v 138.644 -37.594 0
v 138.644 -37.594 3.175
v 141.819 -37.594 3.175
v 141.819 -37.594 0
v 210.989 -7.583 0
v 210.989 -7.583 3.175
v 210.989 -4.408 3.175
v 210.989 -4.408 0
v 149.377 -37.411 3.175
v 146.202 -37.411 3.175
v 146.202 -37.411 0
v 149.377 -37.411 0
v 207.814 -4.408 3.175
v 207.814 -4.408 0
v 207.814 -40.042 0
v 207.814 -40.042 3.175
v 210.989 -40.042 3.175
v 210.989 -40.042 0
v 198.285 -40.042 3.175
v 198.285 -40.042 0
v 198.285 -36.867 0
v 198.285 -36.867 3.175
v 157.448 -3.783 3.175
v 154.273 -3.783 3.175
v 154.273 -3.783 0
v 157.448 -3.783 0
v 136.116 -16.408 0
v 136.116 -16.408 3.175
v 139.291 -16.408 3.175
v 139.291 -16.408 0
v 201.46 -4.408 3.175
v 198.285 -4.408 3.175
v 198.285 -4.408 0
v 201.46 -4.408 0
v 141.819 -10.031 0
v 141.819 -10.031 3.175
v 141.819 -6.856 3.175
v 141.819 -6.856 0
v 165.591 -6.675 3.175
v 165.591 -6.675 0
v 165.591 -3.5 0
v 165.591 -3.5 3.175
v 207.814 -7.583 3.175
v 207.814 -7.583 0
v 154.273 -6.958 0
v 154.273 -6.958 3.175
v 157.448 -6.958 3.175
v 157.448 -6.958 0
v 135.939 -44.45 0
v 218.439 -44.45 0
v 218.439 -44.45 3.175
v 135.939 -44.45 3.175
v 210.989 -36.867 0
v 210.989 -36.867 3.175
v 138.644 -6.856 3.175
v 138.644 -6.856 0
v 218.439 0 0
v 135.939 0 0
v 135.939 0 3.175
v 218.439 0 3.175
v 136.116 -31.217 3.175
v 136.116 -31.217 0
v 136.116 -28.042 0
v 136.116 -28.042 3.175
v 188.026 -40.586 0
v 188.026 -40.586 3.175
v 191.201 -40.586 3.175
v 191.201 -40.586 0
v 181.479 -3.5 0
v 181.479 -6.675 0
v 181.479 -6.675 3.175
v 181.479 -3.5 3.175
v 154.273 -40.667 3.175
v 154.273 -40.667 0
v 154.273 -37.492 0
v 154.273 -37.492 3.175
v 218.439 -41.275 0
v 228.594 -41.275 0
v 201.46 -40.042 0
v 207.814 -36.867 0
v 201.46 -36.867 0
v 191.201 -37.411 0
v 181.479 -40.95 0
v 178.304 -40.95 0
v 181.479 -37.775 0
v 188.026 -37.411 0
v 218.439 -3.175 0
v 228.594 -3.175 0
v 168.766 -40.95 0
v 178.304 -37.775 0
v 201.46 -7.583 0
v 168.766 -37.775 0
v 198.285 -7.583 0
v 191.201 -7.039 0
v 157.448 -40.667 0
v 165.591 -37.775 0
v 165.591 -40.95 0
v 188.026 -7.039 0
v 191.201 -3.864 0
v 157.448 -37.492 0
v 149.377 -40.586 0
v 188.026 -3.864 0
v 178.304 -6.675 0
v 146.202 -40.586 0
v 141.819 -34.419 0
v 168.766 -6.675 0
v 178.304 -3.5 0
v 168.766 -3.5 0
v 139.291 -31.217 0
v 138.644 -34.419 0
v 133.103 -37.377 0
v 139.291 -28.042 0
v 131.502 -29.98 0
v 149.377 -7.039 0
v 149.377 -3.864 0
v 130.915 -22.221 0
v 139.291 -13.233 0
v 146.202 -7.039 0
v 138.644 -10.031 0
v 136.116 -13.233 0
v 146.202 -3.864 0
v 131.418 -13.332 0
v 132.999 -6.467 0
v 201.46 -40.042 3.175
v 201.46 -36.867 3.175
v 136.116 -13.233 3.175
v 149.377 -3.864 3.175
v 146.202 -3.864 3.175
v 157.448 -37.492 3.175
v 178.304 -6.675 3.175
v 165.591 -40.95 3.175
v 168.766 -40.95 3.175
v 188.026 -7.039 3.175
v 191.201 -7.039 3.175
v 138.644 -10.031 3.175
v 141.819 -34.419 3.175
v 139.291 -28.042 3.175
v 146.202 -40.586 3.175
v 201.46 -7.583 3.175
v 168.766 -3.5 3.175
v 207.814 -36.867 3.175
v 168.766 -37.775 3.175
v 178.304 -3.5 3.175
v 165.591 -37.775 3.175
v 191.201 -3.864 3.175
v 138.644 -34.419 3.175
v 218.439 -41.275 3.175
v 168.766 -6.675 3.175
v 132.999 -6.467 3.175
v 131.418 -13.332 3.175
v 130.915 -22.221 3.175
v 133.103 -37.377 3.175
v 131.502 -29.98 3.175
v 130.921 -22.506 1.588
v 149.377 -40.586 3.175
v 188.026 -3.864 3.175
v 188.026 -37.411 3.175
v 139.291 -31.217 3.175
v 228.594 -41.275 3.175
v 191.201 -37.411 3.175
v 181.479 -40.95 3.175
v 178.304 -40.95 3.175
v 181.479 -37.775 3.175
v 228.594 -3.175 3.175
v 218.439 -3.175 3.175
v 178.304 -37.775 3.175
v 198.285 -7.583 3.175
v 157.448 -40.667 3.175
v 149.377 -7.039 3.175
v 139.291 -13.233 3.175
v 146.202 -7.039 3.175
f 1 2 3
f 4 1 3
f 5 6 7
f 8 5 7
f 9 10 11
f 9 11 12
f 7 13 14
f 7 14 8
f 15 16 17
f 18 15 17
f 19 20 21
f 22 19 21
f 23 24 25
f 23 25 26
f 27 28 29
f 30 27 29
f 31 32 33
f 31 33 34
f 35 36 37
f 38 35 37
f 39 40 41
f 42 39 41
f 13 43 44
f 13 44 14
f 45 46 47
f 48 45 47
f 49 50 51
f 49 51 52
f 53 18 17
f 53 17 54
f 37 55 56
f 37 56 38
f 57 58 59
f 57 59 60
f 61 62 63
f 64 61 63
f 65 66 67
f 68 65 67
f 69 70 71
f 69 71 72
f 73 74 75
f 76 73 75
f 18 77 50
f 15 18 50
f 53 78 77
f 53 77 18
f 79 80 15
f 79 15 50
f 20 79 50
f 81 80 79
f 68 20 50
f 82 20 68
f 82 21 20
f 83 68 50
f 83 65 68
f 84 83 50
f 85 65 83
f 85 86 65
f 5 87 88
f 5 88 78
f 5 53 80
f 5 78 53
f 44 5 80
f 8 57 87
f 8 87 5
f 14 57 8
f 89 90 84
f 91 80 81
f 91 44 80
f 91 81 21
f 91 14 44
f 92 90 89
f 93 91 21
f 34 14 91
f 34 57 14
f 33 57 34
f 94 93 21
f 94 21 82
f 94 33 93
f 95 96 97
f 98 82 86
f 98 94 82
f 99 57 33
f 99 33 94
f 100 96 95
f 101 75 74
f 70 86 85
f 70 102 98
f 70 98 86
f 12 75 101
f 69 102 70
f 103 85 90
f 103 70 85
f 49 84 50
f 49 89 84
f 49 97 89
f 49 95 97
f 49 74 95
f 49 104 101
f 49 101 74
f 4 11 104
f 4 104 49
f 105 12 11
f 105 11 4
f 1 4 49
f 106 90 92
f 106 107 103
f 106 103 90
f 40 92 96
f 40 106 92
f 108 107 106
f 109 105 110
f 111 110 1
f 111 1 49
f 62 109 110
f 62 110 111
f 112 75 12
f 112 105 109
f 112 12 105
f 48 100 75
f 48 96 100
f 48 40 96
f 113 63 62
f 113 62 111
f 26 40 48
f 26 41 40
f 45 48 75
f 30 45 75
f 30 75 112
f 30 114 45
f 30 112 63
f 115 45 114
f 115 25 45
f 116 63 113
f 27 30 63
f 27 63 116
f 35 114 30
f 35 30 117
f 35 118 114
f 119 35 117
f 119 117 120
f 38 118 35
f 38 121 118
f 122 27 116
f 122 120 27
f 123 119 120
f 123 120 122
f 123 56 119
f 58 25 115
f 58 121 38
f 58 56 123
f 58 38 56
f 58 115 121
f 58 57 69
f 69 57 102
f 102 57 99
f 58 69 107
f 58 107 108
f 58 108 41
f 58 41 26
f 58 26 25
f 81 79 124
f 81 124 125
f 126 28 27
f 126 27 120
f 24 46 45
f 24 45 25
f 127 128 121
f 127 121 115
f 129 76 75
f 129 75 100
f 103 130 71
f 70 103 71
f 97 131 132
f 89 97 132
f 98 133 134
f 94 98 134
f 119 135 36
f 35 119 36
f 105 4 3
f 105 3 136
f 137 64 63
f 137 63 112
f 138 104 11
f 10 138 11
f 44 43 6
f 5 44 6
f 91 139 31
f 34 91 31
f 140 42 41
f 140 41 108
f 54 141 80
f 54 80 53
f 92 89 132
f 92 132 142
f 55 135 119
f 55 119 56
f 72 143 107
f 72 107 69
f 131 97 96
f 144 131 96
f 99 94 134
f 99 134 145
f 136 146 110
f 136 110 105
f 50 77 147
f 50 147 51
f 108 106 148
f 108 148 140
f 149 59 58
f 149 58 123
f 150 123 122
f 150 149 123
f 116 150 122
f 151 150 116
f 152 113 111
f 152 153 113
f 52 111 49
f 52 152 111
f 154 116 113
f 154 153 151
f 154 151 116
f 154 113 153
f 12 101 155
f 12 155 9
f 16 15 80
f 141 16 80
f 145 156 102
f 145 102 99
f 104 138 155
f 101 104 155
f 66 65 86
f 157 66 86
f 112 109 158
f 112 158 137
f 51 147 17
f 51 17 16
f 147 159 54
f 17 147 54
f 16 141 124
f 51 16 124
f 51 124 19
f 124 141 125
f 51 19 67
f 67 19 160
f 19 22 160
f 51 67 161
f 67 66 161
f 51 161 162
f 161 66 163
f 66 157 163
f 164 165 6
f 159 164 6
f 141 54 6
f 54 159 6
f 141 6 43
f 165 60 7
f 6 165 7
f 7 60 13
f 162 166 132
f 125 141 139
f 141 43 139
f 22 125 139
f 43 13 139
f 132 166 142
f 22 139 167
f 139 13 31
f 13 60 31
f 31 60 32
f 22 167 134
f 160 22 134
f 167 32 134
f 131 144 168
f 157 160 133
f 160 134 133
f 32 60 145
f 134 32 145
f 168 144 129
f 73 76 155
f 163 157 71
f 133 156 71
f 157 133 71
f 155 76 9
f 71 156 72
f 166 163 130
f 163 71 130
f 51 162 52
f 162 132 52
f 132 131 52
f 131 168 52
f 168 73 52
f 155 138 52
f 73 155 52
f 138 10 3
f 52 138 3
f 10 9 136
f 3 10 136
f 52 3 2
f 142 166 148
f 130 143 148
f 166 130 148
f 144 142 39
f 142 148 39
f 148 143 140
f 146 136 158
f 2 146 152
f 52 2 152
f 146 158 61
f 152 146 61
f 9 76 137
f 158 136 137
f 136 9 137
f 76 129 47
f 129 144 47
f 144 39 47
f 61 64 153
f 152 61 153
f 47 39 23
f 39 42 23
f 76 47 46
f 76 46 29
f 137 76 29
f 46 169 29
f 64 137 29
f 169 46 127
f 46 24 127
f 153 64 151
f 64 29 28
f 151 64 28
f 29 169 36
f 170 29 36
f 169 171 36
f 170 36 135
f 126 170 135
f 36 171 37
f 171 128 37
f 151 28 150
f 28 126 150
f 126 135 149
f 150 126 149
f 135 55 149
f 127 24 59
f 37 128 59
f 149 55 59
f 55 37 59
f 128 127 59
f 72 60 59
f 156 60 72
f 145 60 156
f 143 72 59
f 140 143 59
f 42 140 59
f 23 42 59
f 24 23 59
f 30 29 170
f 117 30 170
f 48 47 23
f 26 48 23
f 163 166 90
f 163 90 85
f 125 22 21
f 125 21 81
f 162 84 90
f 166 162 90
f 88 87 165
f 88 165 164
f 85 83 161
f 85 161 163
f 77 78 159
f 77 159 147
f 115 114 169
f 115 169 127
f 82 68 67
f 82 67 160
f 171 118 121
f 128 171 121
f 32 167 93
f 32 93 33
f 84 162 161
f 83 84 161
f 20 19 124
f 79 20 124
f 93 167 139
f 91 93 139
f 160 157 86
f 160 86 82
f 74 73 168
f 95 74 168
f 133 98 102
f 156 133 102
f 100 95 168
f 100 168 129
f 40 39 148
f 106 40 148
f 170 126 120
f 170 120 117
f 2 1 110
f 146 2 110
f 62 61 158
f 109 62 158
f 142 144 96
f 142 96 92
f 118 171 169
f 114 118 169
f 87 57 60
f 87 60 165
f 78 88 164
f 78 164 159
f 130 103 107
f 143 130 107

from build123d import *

# Parameters (mm, degrees)
BOSS_EXTRUDE1_DEPTH = 3.175
CUT_EXTRUDE1_DEPTH  = 3.175
SKETCH3_W           = 3.175
SKETCH3_H           = 3.175
CUT_EXTRUDE2_DEPTH  = 3.175


with BuildPart() as part:
    # Sketch1 → Boss-Extrude1 (new body)
    with BuildSketch(Plane.XY):
        with BuildLine():
            Line((133.353452848, 0), (218.438559169, 0))
            Line((218.438559169, 0), (218.438559169, -3.175))
            Line((218.438559169, -3.175), (228.593504491, -3.175))
            Line((228.593504491, -3.175), (228.593504491, -41.275))
            Line((228.593504491, -41.275), (218.438559169, -41.275))
            Line((218.438559169, -41.275), (218.438559169, -44.45))
            Line((218.438559169, -44.45), (133.353452848, -44.45))
            add(Edge.make_bspline(
                [(133.353452848, 0), (129.670007688, -3.804094497), (126.127807653, -11.460398689), (125.717598982, -27.472957947), (126.742796491, -38.641939676), (133.353452848, -44.45)],
                knots=[0, 0, 0, 0, 0.328355513, 0.50111915, 1, 1, 1, 1], degree=3))
        make_face()
    extrude(amount=BOSS_EXTRUDE1_DEPTH)

    # Sketch2 → Cut-Extrude1 (cut)
    with BuildSketch(Plane.XY.offset(3.175)):
        with BuildLine():
            Line((135.939264538, 0), (128.336629453, 5.186344239))
            Line((128.336629453, 5.186344239), (108.478299615, -42.096060539))
            Line((108.478299615, -42.096060539), (132.091652271, -56.370762285))
            Line((132.091652271, -56.370762285), (135.939264538, -44.45))
            add(Edge.make_bspline(
                [(135.939264538, 0), (131.854984435, -6.817127359), (129.691129791, -22.368396799), (132.428444631, -37.615693349), (135.939264538, -44.45)],
                knots=[0, 0, 0, 0, 0.506942817, 1, 1, 1, 1], degree=3))
        make_face()
    extrude(amount=-CUT_EXTRUDE1_DEPTH, mode=Mode.SUBTRACT)

    # Sketch3 → Cut-Extrude2 (cut)
    with BuildSketch(Plane.XY.offset(3.175)):
        with Locations((140.231064965, -8.443013353)):
            Rectangle(SKETCH3_W, SKETCH3_H)
        with Locations((155.86048705, -5.370418658)):
            Rectangle(SKETCH3_W, SKETCH3_H)
        with Locations((147.789651456, -5.451485607)):
            Rectangle(SKETCH3_W, SKETCH3_H)
        with Locations((167.178168731, -5.087390187)):
            Rectangle(SKETCH3_W, SKETCH3_H)
        with Locations((179.891954361, -5.087390187)):
            Rectangle(SKETCH3_W, SKETCH3_H)
        with Locations((189.613004004, -5.451485607)):
            Rectangle(SKETCH3_W, SKETCH3_H)
        with Locations((199.872722139, -5.995153624)):
            Rectangle(SKETCH3_W, SKETCH3_H)
        with Locations((209.401626696, -38.454846376)):
            Rectangle(SKETCH3_W, SKETCH3_H)
        with Locations((199.872722139, -38.454846376)):
            Rectangle(SKETCH3_W, SKETCH3_H)
        with Locations((189.613004004, -38.998514393)):
            Rectangle(SKETCH3_W, SKETCH3_H)
        with Locations((179.891954361, -39.362609813)):
            Rectangle(SKETCH3_W, SKETCH3_H)
        with Locations((167.178168731, -39.362609813)):
            Rectangle(SKETCH3_W, SKETCH3_H)
        with Locations((147.789651456, -38.998514393)):
            Rectangle(SKETCH3_W, SKETCH3_H)
        with Locations((155.86048705, -39.079581342)):
            Rectangle(SKETCH3_W, SKETCH3_H)
        with Locations((140.231064965, -36.006986647)):
            Rectangle(SKETCH3_W, SKETCH3_H)
        with Locations((137.703428064, -29.629038879)):
            Rectangle(SKETCH3_W, SKETCH3_H)
        with Locations((137.703428064, -14.820961121)):
            Rectangle(SKETCH3_W, SKETCH3_H)
        with Locations((209.401626696, -5.995153624)):
            Rectangle(SKETCH3_W, SKETCH3_H)
    extrude(amount=-CUT_EXTRUDE2_DEPTH, mode=Mode.SUBTRACT)


solid = part.part
